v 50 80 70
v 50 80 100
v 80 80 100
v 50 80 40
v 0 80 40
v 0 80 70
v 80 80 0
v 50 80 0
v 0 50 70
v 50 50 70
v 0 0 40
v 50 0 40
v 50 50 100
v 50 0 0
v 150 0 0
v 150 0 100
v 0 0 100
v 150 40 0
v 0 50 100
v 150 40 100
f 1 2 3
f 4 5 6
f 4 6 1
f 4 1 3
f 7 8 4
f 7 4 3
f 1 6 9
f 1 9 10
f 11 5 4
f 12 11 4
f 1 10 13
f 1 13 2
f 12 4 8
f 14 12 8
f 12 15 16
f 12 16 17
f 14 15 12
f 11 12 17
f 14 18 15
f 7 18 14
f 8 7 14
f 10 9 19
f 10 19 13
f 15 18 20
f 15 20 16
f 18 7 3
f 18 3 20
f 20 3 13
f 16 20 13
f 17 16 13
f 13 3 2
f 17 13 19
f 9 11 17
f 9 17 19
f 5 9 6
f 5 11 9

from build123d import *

# Parameters (mm, degrees)
BOSS_EXTRUDE1_DEPTH = 100
SKETCH2_W           = 50
SKETCH2_H           = 30
BOSS_EXTRUDE2_DEPTH = 30
SKETCH4_W           = 50
SKETCH4_H           = 40
CUT_EXTRUDE2_DEPTH  = 188.082869339


with BuildPart() as part:
    # Sketch1 → Boss-Extrude1 (new body)
    with BuildSketch(Plane.XY):
        Polygon((0, 0), (0, 50), (50, 50), (50, 80), (80, 80), (150, 40), (150, 0), align=None)
    extrude(amount=BOSS_EXTRUDE1_DEPTH)

    # Sketch2 → Boss-Extrude2 (add)
    with BuildSketch(Plane(origin=(0, 80, 0), x_dir=(1, 0, 0), z_dir=(0, 1, 0))):
        with Locations((25, -55)):
            Rectangle(SKETCH2_W, SKETCH2_H)
    extrude(amount=-BOSS_EXTRUDE2_DEPTH)

    # Sketch4 → Cut-Extrude2 (cut, through all)
    with BuildSketch(Plane(origin=(0, 50, 0), x_dir=(1, 0, 0), z_dir=(0, 1, 0))):
        with Locations((25, -20)):
            Rectangle(SKETCH4_W, SKETCH4_H)
    extrude(amount=-CUT_EXTRUDE2_DEPTH, mode=Mode.SUBTRACT)


solid = part.part
